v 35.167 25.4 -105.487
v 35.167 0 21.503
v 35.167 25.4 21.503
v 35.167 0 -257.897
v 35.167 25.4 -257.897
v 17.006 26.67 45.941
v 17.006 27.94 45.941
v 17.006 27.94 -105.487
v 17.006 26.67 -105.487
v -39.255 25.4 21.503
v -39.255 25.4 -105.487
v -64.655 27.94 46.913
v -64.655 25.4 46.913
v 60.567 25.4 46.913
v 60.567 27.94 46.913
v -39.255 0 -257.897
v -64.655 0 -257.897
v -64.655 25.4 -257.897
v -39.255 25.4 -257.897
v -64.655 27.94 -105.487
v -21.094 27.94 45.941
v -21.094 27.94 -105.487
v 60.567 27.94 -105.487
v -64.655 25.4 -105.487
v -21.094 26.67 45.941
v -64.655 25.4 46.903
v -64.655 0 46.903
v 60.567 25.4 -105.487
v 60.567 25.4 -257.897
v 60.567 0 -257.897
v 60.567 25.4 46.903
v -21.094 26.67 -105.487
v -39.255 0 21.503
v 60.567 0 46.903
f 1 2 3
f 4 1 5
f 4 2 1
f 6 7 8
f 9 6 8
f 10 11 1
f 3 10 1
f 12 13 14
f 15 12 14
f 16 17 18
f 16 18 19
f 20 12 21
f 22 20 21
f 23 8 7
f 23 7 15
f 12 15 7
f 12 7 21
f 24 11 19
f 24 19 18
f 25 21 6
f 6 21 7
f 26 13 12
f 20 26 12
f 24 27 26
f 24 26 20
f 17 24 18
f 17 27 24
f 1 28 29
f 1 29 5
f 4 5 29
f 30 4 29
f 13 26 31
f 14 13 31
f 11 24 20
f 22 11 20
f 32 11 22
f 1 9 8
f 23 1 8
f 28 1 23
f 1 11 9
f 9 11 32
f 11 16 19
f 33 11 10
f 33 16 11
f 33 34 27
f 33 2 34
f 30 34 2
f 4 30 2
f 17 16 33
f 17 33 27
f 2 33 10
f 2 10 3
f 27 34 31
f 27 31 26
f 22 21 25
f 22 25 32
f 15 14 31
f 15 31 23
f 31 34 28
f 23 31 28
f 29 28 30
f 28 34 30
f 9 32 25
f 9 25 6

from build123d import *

# Parameters (mm, degrees)
BOSS_EXTRUDE1_DEPTH = 25.4
SKETCH3_W           = 125.222
SKETCH3_H           = 152.4
BOSS_EXTRUDE2_DEPTH = 2.54
SKETCH5_W           = 38.1
SKETCH5_H           = 152.4
CUT_EXTRUDE1_DEPTH  = 1.27


with BuildPart() as part:
    # Sketch1 → Boss-Extrude1 (new body)
    with BuildSketch(Plane(origin=(0, 0, 0), x_dir=(1, 0, 0), z_dir=(0, 1, 0))):
        Polygon((-64.654545455, 257.896590909), (-39.254545455, 257.896590909), (-39.254545455, -21.503409091), (35.167454545, -21.503409091), (35.167454545, 257.896590909), (60.567454545, 257.896590909), (60.567454545, -46.903409091), (-64.654545455, -46.903409091), align=None)
    extrude(amount=BOSS_EXTRUDE1_DEPTH)

    # Sketch3 → Boss-Extrude2 (add)
    with BuildSketch(Plane(origin=(0, 25.4, 0), x_dir=(1, 0, 0), z_dir=(0, 1, 0))):
        with Locations((-2.043545455, 29.287074317)):
            Rectangle(SKETCH3_W, SKETCH3_H)
    extrude(amount=BOSS_EXTRUDE2_DEPTH)

    # Sketch5 → Cut-Extrude1 (cut)
    with BuildSketch(Plane(origin=(0, 27.94, 0), x_dir=(1, 0, 0), z_dir=(0, 1, 0))):
        with Locations((-2.043545455, 30.25907177)):
            Rectangle(SKETCH5_W, SKETCH5_H)
    extrude(amount=-CUT_EXTRUDE1_DEPTH, mode=Mode.SUBTRACT)


solid = part.part
